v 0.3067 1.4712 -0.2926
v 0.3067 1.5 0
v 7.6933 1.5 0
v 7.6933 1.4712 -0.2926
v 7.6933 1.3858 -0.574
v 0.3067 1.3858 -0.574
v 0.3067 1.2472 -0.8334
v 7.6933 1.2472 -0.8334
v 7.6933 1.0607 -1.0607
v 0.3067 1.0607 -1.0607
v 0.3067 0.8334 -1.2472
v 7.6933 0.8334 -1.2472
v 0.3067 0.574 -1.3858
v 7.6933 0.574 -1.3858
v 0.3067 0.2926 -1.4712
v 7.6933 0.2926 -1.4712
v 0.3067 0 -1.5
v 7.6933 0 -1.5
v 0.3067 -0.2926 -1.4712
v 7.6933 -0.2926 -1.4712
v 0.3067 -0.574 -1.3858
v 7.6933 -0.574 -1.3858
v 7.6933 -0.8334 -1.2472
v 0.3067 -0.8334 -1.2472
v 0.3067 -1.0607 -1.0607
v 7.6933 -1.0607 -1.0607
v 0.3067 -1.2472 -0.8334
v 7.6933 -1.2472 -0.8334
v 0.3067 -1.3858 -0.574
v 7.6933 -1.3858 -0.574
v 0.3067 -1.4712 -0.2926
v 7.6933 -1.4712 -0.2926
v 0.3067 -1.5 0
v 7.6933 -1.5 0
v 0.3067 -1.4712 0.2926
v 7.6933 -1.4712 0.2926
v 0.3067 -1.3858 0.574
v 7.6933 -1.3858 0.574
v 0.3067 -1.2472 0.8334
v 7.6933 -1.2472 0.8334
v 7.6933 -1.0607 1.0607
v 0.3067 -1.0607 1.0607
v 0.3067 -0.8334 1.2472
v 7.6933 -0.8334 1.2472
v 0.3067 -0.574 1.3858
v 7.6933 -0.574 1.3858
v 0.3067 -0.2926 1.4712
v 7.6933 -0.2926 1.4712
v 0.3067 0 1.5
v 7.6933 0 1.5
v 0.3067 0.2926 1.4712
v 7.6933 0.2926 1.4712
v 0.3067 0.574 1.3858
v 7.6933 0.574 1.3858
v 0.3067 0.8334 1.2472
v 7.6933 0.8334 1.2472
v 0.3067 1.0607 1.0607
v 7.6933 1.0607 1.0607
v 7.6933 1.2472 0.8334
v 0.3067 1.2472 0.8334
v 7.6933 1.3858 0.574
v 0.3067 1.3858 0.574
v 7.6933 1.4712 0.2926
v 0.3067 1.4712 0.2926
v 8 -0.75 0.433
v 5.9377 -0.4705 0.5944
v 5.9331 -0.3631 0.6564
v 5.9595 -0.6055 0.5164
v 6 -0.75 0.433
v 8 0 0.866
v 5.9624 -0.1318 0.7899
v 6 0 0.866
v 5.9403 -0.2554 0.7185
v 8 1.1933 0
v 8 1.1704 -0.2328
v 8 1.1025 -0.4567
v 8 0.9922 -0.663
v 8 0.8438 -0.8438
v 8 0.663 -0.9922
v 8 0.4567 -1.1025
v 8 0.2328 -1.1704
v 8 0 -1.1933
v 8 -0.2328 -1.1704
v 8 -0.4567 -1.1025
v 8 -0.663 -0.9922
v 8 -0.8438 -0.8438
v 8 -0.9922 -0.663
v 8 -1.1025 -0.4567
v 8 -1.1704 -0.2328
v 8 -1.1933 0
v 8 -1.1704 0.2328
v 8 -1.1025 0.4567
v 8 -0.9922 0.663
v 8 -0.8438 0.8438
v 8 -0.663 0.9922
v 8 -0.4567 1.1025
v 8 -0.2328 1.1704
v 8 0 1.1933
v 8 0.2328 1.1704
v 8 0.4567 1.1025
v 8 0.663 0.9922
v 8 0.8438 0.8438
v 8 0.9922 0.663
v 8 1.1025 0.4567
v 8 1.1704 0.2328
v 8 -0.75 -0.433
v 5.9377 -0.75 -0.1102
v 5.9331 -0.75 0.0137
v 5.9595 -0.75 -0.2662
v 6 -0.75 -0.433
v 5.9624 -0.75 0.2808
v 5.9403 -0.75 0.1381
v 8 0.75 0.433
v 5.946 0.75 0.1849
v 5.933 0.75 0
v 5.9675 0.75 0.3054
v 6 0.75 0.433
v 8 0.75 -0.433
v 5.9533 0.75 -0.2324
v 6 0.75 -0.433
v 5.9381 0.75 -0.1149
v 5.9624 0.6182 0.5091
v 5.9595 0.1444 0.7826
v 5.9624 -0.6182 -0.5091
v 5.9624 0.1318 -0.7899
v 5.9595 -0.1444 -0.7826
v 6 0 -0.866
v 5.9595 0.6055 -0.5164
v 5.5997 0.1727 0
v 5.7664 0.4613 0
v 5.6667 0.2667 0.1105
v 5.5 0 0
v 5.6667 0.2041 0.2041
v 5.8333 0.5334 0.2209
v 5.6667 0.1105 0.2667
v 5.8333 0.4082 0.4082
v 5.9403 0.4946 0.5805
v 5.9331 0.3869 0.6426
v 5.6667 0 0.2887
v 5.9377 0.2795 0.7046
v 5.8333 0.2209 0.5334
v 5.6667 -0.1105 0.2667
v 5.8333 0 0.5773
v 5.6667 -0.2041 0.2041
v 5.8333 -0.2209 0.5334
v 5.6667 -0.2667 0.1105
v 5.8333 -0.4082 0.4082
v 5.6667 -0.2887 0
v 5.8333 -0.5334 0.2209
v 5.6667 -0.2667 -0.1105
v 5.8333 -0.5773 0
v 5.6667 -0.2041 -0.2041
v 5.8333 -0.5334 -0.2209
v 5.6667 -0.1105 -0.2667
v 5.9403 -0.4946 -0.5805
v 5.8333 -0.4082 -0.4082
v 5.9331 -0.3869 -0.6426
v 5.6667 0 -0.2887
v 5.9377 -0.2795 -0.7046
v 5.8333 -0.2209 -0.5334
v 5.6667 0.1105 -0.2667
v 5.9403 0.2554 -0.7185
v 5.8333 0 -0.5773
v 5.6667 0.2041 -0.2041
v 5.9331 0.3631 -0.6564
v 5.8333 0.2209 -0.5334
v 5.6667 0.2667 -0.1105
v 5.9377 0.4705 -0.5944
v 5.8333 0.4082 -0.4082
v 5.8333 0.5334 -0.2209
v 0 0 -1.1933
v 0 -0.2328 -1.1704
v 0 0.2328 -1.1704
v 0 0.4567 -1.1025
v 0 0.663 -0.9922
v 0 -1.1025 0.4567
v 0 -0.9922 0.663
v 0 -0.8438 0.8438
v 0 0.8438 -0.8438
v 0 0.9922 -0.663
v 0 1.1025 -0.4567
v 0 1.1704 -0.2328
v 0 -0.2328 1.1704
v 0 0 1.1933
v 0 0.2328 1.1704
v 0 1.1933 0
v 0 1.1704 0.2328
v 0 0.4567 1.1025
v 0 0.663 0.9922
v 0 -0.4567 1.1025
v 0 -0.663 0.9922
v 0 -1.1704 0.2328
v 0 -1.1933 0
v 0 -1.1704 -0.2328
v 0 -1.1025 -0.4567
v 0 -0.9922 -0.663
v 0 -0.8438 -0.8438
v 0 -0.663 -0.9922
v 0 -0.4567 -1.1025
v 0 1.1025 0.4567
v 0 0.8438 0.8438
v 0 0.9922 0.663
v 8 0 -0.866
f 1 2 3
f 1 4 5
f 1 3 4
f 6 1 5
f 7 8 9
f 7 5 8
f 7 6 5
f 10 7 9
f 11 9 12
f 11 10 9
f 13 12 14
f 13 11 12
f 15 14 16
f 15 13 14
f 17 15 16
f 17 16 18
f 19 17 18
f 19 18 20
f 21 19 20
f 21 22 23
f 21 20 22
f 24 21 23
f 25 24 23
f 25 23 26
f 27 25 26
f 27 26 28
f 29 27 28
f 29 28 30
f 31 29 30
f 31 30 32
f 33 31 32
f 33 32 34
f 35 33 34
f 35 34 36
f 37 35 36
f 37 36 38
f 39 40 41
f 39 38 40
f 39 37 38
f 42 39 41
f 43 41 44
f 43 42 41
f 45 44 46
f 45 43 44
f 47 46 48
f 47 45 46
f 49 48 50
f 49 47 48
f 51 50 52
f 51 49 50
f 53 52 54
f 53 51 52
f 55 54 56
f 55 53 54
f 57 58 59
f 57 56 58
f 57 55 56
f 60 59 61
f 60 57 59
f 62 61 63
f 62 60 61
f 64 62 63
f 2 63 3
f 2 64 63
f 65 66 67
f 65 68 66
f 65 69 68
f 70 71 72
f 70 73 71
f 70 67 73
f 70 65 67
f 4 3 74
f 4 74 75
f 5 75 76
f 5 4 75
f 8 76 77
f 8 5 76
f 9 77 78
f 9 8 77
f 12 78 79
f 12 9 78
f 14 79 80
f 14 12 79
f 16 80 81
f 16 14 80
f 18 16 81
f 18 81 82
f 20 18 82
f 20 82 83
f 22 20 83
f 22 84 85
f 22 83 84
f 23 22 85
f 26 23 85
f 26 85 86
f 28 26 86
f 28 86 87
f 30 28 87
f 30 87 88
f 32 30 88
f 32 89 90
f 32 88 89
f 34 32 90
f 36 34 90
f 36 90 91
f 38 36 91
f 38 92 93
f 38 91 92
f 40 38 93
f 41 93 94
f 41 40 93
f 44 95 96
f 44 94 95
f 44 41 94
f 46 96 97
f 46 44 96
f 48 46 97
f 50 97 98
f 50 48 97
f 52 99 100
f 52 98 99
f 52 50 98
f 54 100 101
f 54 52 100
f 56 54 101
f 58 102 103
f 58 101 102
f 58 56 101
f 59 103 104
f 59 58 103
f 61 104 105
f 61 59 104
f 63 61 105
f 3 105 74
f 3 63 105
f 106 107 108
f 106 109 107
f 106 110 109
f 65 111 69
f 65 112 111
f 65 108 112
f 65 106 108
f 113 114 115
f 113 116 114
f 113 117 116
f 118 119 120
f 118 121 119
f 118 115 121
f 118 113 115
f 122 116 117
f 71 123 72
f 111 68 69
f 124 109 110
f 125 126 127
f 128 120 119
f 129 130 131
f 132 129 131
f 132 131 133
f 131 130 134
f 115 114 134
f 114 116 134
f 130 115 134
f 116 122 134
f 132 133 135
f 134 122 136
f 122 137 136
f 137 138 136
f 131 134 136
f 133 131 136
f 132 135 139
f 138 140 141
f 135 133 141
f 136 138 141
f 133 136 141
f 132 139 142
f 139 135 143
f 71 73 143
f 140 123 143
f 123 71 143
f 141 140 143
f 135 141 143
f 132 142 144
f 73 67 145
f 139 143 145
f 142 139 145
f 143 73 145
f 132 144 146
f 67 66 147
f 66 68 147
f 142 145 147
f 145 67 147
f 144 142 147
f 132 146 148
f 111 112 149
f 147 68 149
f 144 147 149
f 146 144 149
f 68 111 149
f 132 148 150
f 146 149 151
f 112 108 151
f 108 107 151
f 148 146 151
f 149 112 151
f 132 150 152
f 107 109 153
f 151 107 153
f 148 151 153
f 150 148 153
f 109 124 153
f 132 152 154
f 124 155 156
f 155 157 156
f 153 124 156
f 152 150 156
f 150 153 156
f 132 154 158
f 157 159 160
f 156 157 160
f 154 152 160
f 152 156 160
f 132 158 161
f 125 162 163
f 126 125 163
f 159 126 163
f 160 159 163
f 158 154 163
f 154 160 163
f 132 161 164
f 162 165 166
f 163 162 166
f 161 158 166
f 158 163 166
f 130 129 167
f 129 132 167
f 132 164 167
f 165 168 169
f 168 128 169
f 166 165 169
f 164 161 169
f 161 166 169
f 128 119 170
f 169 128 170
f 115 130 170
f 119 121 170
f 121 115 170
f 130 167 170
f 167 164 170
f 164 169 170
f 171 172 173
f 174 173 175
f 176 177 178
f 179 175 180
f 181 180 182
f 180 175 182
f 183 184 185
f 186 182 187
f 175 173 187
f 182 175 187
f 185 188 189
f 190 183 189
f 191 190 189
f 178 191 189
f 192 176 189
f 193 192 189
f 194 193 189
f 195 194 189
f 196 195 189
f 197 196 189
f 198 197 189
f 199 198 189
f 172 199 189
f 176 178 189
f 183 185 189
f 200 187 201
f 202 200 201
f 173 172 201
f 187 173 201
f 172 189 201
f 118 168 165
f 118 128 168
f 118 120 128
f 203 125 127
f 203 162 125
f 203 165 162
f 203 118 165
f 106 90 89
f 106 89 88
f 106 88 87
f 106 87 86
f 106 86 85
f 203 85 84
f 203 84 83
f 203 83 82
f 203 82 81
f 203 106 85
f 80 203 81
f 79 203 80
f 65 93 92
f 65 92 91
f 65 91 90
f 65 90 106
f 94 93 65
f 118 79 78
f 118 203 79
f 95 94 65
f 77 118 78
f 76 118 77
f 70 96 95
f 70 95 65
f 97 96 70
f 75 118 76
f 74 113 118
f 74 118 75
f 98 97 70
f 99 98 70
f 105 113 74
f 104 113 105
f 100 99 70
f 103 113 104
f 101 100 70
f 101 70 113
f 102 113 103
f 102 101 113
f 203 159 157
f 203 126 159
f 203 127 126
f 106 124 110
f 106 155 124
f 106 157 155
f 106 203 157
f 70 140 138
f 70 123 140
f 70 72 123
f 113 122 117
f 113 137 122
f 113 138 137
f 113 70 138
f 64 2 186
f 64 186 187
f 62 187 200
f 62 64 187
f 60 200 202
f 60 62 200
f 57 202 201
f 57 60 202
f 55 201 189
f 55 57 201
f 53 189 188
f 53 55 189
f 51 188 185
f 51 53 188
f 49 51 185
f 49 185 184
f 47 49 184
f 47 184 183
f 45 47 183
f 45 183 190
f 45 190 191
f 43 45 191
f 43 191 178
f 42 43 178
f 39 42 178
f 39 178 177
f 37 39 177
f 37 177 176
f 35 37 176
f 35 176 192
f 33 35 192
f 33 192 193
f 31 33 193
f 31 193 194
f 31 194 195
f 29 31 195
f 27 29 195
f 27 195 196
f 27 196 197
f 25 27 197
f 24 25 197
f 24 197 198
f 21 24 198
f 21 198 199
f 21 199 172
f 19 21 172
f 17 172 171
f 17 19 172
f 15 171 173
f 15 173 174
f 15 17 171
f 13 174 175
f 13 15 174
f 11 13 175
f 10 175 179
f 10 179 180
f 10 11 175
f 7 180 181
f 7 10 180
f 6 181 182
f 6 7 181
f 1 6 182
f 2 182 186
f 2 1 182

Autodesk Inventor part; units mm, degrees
ref_plane "YZ Plane" through (0, 0, 0) normal (1, 0, 0) x (0, 1, 0)
ref_plane "XZ Plane" through (0, 0, 0) normal (0, 1, 0) x (-1, 0, 0)
sketch "Sketch1" plane through (0, 0, 0) normal (0, 0, 1) x (1, 0, 0)
  line L0 (0, 0) -> (5.5, 0)
  line L1 (8, 0.866) -> (8, 1.5)
  line L2 (8, 1.5) -> (0, 1.5)
  line L3 (8, 0.866) -> (6, 0.866)
  line L4 (6, 0.866) -> (5.5, 0)
  line L5 (0, -0.3) -> (0, 1.8) projected
  line L6 (0, 1.5) -> (0, 0)
  dimension "d0" = 2
  dimension "d1" = 60
  dimension "d2" = 3
  dimension "d3" = 1.7321
  dimension "d5" = 8
revolve "Body" add sketch "Sketch1" angle 360 about axis through (0, 0, 0) along (1, 0, 0)
chamfer "Chamfer1" distance 0.3067 angle 45 1 edges at (8, -1.5, 0) measured on face at (8, 1.2658, -0.1887)
sketch "Sketch2" plane through (8, 0, 0) normal (1, 0, 0) x (0, 0, -1)
  circle A0 centre (0, 0) radius 0.866 projected
  line L0 (-0.433, 0.75) -> (0.433, 0.75)
  line L1 (0.433, 0.75) -> (0.866, 0)
  line L2 (0.866, 0) -> (0.433, -0.75)
  line L3 (0.433, -0.75) -> (-0.433, -0.75)
  line L4 (-0.433, -0.75) -> (-0.866, 0)
  line L5 (-0.866, 0) -> (-0.433, 0.75)
extrude "Slot" add sketch "Sketch2" against normal up to next contours L1 A0 | A0 L2 | L0 A0 | A0 L3 | L5 A0 | A0 L4
thread "Thread" size "M3x0.5" class "6g" standard "ISO Metric profile" length 8
chamfer "Chamfer2" distance 0.3067 angle 45 1 edges at (0, -1.5, 0) measured on face at (2.5644, 1.4806, -0.2406)
ref_plane "Work Plane1" through (4, 0, 0) normal (0, 0.5, 0.866) x (1, 0, 0)
equation "\"d0\" = INTI"
equation "\"d2\" = NND"
equation "\"d3\" = 1.1547 * SW"
equation "\"d5\" = NLG"
equation "\"d7\" = -0.5 * GD1 + 0.5 * NND"
equation "\"d8\" = FAWI"
equation "\"d29\" = -0.5 * GD1 + 0.5 * NND"
equation "\"d11\" = NLG"
equation "\"d13\" = -0.5 * GD1 + 0.5 * NND"
equation "\"d14\" = FAWI"
equation "\"d30\" = -0.5 * GD1 + 0.5 * NND"
equation "\"NND\" = 3"
equation "\"NLG\" = 8"
equation "\"INTI\" = 2"
equation "\"FAWI\" = 45deg"
equation "\"SW\" = 1.5"
equation "\"GD1\" = THREADDIA - 1.2269 * PTC"
equation "\"FAWI1\" = 45deg"
equation "\"GUL\" = 0.61345 * PTC"
equation "\"SPD\" = 2"
equation "\"SEWI\" = 90deg"
equation "\"TOA\" = 30deg"
equation "\"THREADDIA\" = 3"
equation "\"PTC\" = 0.5"
equation "\"GAL\" = 0.61345 * PTC"
equation "\"E0\" = 1.155 * SW"
properties part number "ISO 4026 - M3 x 8" material "Stainless Steel, 440C"
